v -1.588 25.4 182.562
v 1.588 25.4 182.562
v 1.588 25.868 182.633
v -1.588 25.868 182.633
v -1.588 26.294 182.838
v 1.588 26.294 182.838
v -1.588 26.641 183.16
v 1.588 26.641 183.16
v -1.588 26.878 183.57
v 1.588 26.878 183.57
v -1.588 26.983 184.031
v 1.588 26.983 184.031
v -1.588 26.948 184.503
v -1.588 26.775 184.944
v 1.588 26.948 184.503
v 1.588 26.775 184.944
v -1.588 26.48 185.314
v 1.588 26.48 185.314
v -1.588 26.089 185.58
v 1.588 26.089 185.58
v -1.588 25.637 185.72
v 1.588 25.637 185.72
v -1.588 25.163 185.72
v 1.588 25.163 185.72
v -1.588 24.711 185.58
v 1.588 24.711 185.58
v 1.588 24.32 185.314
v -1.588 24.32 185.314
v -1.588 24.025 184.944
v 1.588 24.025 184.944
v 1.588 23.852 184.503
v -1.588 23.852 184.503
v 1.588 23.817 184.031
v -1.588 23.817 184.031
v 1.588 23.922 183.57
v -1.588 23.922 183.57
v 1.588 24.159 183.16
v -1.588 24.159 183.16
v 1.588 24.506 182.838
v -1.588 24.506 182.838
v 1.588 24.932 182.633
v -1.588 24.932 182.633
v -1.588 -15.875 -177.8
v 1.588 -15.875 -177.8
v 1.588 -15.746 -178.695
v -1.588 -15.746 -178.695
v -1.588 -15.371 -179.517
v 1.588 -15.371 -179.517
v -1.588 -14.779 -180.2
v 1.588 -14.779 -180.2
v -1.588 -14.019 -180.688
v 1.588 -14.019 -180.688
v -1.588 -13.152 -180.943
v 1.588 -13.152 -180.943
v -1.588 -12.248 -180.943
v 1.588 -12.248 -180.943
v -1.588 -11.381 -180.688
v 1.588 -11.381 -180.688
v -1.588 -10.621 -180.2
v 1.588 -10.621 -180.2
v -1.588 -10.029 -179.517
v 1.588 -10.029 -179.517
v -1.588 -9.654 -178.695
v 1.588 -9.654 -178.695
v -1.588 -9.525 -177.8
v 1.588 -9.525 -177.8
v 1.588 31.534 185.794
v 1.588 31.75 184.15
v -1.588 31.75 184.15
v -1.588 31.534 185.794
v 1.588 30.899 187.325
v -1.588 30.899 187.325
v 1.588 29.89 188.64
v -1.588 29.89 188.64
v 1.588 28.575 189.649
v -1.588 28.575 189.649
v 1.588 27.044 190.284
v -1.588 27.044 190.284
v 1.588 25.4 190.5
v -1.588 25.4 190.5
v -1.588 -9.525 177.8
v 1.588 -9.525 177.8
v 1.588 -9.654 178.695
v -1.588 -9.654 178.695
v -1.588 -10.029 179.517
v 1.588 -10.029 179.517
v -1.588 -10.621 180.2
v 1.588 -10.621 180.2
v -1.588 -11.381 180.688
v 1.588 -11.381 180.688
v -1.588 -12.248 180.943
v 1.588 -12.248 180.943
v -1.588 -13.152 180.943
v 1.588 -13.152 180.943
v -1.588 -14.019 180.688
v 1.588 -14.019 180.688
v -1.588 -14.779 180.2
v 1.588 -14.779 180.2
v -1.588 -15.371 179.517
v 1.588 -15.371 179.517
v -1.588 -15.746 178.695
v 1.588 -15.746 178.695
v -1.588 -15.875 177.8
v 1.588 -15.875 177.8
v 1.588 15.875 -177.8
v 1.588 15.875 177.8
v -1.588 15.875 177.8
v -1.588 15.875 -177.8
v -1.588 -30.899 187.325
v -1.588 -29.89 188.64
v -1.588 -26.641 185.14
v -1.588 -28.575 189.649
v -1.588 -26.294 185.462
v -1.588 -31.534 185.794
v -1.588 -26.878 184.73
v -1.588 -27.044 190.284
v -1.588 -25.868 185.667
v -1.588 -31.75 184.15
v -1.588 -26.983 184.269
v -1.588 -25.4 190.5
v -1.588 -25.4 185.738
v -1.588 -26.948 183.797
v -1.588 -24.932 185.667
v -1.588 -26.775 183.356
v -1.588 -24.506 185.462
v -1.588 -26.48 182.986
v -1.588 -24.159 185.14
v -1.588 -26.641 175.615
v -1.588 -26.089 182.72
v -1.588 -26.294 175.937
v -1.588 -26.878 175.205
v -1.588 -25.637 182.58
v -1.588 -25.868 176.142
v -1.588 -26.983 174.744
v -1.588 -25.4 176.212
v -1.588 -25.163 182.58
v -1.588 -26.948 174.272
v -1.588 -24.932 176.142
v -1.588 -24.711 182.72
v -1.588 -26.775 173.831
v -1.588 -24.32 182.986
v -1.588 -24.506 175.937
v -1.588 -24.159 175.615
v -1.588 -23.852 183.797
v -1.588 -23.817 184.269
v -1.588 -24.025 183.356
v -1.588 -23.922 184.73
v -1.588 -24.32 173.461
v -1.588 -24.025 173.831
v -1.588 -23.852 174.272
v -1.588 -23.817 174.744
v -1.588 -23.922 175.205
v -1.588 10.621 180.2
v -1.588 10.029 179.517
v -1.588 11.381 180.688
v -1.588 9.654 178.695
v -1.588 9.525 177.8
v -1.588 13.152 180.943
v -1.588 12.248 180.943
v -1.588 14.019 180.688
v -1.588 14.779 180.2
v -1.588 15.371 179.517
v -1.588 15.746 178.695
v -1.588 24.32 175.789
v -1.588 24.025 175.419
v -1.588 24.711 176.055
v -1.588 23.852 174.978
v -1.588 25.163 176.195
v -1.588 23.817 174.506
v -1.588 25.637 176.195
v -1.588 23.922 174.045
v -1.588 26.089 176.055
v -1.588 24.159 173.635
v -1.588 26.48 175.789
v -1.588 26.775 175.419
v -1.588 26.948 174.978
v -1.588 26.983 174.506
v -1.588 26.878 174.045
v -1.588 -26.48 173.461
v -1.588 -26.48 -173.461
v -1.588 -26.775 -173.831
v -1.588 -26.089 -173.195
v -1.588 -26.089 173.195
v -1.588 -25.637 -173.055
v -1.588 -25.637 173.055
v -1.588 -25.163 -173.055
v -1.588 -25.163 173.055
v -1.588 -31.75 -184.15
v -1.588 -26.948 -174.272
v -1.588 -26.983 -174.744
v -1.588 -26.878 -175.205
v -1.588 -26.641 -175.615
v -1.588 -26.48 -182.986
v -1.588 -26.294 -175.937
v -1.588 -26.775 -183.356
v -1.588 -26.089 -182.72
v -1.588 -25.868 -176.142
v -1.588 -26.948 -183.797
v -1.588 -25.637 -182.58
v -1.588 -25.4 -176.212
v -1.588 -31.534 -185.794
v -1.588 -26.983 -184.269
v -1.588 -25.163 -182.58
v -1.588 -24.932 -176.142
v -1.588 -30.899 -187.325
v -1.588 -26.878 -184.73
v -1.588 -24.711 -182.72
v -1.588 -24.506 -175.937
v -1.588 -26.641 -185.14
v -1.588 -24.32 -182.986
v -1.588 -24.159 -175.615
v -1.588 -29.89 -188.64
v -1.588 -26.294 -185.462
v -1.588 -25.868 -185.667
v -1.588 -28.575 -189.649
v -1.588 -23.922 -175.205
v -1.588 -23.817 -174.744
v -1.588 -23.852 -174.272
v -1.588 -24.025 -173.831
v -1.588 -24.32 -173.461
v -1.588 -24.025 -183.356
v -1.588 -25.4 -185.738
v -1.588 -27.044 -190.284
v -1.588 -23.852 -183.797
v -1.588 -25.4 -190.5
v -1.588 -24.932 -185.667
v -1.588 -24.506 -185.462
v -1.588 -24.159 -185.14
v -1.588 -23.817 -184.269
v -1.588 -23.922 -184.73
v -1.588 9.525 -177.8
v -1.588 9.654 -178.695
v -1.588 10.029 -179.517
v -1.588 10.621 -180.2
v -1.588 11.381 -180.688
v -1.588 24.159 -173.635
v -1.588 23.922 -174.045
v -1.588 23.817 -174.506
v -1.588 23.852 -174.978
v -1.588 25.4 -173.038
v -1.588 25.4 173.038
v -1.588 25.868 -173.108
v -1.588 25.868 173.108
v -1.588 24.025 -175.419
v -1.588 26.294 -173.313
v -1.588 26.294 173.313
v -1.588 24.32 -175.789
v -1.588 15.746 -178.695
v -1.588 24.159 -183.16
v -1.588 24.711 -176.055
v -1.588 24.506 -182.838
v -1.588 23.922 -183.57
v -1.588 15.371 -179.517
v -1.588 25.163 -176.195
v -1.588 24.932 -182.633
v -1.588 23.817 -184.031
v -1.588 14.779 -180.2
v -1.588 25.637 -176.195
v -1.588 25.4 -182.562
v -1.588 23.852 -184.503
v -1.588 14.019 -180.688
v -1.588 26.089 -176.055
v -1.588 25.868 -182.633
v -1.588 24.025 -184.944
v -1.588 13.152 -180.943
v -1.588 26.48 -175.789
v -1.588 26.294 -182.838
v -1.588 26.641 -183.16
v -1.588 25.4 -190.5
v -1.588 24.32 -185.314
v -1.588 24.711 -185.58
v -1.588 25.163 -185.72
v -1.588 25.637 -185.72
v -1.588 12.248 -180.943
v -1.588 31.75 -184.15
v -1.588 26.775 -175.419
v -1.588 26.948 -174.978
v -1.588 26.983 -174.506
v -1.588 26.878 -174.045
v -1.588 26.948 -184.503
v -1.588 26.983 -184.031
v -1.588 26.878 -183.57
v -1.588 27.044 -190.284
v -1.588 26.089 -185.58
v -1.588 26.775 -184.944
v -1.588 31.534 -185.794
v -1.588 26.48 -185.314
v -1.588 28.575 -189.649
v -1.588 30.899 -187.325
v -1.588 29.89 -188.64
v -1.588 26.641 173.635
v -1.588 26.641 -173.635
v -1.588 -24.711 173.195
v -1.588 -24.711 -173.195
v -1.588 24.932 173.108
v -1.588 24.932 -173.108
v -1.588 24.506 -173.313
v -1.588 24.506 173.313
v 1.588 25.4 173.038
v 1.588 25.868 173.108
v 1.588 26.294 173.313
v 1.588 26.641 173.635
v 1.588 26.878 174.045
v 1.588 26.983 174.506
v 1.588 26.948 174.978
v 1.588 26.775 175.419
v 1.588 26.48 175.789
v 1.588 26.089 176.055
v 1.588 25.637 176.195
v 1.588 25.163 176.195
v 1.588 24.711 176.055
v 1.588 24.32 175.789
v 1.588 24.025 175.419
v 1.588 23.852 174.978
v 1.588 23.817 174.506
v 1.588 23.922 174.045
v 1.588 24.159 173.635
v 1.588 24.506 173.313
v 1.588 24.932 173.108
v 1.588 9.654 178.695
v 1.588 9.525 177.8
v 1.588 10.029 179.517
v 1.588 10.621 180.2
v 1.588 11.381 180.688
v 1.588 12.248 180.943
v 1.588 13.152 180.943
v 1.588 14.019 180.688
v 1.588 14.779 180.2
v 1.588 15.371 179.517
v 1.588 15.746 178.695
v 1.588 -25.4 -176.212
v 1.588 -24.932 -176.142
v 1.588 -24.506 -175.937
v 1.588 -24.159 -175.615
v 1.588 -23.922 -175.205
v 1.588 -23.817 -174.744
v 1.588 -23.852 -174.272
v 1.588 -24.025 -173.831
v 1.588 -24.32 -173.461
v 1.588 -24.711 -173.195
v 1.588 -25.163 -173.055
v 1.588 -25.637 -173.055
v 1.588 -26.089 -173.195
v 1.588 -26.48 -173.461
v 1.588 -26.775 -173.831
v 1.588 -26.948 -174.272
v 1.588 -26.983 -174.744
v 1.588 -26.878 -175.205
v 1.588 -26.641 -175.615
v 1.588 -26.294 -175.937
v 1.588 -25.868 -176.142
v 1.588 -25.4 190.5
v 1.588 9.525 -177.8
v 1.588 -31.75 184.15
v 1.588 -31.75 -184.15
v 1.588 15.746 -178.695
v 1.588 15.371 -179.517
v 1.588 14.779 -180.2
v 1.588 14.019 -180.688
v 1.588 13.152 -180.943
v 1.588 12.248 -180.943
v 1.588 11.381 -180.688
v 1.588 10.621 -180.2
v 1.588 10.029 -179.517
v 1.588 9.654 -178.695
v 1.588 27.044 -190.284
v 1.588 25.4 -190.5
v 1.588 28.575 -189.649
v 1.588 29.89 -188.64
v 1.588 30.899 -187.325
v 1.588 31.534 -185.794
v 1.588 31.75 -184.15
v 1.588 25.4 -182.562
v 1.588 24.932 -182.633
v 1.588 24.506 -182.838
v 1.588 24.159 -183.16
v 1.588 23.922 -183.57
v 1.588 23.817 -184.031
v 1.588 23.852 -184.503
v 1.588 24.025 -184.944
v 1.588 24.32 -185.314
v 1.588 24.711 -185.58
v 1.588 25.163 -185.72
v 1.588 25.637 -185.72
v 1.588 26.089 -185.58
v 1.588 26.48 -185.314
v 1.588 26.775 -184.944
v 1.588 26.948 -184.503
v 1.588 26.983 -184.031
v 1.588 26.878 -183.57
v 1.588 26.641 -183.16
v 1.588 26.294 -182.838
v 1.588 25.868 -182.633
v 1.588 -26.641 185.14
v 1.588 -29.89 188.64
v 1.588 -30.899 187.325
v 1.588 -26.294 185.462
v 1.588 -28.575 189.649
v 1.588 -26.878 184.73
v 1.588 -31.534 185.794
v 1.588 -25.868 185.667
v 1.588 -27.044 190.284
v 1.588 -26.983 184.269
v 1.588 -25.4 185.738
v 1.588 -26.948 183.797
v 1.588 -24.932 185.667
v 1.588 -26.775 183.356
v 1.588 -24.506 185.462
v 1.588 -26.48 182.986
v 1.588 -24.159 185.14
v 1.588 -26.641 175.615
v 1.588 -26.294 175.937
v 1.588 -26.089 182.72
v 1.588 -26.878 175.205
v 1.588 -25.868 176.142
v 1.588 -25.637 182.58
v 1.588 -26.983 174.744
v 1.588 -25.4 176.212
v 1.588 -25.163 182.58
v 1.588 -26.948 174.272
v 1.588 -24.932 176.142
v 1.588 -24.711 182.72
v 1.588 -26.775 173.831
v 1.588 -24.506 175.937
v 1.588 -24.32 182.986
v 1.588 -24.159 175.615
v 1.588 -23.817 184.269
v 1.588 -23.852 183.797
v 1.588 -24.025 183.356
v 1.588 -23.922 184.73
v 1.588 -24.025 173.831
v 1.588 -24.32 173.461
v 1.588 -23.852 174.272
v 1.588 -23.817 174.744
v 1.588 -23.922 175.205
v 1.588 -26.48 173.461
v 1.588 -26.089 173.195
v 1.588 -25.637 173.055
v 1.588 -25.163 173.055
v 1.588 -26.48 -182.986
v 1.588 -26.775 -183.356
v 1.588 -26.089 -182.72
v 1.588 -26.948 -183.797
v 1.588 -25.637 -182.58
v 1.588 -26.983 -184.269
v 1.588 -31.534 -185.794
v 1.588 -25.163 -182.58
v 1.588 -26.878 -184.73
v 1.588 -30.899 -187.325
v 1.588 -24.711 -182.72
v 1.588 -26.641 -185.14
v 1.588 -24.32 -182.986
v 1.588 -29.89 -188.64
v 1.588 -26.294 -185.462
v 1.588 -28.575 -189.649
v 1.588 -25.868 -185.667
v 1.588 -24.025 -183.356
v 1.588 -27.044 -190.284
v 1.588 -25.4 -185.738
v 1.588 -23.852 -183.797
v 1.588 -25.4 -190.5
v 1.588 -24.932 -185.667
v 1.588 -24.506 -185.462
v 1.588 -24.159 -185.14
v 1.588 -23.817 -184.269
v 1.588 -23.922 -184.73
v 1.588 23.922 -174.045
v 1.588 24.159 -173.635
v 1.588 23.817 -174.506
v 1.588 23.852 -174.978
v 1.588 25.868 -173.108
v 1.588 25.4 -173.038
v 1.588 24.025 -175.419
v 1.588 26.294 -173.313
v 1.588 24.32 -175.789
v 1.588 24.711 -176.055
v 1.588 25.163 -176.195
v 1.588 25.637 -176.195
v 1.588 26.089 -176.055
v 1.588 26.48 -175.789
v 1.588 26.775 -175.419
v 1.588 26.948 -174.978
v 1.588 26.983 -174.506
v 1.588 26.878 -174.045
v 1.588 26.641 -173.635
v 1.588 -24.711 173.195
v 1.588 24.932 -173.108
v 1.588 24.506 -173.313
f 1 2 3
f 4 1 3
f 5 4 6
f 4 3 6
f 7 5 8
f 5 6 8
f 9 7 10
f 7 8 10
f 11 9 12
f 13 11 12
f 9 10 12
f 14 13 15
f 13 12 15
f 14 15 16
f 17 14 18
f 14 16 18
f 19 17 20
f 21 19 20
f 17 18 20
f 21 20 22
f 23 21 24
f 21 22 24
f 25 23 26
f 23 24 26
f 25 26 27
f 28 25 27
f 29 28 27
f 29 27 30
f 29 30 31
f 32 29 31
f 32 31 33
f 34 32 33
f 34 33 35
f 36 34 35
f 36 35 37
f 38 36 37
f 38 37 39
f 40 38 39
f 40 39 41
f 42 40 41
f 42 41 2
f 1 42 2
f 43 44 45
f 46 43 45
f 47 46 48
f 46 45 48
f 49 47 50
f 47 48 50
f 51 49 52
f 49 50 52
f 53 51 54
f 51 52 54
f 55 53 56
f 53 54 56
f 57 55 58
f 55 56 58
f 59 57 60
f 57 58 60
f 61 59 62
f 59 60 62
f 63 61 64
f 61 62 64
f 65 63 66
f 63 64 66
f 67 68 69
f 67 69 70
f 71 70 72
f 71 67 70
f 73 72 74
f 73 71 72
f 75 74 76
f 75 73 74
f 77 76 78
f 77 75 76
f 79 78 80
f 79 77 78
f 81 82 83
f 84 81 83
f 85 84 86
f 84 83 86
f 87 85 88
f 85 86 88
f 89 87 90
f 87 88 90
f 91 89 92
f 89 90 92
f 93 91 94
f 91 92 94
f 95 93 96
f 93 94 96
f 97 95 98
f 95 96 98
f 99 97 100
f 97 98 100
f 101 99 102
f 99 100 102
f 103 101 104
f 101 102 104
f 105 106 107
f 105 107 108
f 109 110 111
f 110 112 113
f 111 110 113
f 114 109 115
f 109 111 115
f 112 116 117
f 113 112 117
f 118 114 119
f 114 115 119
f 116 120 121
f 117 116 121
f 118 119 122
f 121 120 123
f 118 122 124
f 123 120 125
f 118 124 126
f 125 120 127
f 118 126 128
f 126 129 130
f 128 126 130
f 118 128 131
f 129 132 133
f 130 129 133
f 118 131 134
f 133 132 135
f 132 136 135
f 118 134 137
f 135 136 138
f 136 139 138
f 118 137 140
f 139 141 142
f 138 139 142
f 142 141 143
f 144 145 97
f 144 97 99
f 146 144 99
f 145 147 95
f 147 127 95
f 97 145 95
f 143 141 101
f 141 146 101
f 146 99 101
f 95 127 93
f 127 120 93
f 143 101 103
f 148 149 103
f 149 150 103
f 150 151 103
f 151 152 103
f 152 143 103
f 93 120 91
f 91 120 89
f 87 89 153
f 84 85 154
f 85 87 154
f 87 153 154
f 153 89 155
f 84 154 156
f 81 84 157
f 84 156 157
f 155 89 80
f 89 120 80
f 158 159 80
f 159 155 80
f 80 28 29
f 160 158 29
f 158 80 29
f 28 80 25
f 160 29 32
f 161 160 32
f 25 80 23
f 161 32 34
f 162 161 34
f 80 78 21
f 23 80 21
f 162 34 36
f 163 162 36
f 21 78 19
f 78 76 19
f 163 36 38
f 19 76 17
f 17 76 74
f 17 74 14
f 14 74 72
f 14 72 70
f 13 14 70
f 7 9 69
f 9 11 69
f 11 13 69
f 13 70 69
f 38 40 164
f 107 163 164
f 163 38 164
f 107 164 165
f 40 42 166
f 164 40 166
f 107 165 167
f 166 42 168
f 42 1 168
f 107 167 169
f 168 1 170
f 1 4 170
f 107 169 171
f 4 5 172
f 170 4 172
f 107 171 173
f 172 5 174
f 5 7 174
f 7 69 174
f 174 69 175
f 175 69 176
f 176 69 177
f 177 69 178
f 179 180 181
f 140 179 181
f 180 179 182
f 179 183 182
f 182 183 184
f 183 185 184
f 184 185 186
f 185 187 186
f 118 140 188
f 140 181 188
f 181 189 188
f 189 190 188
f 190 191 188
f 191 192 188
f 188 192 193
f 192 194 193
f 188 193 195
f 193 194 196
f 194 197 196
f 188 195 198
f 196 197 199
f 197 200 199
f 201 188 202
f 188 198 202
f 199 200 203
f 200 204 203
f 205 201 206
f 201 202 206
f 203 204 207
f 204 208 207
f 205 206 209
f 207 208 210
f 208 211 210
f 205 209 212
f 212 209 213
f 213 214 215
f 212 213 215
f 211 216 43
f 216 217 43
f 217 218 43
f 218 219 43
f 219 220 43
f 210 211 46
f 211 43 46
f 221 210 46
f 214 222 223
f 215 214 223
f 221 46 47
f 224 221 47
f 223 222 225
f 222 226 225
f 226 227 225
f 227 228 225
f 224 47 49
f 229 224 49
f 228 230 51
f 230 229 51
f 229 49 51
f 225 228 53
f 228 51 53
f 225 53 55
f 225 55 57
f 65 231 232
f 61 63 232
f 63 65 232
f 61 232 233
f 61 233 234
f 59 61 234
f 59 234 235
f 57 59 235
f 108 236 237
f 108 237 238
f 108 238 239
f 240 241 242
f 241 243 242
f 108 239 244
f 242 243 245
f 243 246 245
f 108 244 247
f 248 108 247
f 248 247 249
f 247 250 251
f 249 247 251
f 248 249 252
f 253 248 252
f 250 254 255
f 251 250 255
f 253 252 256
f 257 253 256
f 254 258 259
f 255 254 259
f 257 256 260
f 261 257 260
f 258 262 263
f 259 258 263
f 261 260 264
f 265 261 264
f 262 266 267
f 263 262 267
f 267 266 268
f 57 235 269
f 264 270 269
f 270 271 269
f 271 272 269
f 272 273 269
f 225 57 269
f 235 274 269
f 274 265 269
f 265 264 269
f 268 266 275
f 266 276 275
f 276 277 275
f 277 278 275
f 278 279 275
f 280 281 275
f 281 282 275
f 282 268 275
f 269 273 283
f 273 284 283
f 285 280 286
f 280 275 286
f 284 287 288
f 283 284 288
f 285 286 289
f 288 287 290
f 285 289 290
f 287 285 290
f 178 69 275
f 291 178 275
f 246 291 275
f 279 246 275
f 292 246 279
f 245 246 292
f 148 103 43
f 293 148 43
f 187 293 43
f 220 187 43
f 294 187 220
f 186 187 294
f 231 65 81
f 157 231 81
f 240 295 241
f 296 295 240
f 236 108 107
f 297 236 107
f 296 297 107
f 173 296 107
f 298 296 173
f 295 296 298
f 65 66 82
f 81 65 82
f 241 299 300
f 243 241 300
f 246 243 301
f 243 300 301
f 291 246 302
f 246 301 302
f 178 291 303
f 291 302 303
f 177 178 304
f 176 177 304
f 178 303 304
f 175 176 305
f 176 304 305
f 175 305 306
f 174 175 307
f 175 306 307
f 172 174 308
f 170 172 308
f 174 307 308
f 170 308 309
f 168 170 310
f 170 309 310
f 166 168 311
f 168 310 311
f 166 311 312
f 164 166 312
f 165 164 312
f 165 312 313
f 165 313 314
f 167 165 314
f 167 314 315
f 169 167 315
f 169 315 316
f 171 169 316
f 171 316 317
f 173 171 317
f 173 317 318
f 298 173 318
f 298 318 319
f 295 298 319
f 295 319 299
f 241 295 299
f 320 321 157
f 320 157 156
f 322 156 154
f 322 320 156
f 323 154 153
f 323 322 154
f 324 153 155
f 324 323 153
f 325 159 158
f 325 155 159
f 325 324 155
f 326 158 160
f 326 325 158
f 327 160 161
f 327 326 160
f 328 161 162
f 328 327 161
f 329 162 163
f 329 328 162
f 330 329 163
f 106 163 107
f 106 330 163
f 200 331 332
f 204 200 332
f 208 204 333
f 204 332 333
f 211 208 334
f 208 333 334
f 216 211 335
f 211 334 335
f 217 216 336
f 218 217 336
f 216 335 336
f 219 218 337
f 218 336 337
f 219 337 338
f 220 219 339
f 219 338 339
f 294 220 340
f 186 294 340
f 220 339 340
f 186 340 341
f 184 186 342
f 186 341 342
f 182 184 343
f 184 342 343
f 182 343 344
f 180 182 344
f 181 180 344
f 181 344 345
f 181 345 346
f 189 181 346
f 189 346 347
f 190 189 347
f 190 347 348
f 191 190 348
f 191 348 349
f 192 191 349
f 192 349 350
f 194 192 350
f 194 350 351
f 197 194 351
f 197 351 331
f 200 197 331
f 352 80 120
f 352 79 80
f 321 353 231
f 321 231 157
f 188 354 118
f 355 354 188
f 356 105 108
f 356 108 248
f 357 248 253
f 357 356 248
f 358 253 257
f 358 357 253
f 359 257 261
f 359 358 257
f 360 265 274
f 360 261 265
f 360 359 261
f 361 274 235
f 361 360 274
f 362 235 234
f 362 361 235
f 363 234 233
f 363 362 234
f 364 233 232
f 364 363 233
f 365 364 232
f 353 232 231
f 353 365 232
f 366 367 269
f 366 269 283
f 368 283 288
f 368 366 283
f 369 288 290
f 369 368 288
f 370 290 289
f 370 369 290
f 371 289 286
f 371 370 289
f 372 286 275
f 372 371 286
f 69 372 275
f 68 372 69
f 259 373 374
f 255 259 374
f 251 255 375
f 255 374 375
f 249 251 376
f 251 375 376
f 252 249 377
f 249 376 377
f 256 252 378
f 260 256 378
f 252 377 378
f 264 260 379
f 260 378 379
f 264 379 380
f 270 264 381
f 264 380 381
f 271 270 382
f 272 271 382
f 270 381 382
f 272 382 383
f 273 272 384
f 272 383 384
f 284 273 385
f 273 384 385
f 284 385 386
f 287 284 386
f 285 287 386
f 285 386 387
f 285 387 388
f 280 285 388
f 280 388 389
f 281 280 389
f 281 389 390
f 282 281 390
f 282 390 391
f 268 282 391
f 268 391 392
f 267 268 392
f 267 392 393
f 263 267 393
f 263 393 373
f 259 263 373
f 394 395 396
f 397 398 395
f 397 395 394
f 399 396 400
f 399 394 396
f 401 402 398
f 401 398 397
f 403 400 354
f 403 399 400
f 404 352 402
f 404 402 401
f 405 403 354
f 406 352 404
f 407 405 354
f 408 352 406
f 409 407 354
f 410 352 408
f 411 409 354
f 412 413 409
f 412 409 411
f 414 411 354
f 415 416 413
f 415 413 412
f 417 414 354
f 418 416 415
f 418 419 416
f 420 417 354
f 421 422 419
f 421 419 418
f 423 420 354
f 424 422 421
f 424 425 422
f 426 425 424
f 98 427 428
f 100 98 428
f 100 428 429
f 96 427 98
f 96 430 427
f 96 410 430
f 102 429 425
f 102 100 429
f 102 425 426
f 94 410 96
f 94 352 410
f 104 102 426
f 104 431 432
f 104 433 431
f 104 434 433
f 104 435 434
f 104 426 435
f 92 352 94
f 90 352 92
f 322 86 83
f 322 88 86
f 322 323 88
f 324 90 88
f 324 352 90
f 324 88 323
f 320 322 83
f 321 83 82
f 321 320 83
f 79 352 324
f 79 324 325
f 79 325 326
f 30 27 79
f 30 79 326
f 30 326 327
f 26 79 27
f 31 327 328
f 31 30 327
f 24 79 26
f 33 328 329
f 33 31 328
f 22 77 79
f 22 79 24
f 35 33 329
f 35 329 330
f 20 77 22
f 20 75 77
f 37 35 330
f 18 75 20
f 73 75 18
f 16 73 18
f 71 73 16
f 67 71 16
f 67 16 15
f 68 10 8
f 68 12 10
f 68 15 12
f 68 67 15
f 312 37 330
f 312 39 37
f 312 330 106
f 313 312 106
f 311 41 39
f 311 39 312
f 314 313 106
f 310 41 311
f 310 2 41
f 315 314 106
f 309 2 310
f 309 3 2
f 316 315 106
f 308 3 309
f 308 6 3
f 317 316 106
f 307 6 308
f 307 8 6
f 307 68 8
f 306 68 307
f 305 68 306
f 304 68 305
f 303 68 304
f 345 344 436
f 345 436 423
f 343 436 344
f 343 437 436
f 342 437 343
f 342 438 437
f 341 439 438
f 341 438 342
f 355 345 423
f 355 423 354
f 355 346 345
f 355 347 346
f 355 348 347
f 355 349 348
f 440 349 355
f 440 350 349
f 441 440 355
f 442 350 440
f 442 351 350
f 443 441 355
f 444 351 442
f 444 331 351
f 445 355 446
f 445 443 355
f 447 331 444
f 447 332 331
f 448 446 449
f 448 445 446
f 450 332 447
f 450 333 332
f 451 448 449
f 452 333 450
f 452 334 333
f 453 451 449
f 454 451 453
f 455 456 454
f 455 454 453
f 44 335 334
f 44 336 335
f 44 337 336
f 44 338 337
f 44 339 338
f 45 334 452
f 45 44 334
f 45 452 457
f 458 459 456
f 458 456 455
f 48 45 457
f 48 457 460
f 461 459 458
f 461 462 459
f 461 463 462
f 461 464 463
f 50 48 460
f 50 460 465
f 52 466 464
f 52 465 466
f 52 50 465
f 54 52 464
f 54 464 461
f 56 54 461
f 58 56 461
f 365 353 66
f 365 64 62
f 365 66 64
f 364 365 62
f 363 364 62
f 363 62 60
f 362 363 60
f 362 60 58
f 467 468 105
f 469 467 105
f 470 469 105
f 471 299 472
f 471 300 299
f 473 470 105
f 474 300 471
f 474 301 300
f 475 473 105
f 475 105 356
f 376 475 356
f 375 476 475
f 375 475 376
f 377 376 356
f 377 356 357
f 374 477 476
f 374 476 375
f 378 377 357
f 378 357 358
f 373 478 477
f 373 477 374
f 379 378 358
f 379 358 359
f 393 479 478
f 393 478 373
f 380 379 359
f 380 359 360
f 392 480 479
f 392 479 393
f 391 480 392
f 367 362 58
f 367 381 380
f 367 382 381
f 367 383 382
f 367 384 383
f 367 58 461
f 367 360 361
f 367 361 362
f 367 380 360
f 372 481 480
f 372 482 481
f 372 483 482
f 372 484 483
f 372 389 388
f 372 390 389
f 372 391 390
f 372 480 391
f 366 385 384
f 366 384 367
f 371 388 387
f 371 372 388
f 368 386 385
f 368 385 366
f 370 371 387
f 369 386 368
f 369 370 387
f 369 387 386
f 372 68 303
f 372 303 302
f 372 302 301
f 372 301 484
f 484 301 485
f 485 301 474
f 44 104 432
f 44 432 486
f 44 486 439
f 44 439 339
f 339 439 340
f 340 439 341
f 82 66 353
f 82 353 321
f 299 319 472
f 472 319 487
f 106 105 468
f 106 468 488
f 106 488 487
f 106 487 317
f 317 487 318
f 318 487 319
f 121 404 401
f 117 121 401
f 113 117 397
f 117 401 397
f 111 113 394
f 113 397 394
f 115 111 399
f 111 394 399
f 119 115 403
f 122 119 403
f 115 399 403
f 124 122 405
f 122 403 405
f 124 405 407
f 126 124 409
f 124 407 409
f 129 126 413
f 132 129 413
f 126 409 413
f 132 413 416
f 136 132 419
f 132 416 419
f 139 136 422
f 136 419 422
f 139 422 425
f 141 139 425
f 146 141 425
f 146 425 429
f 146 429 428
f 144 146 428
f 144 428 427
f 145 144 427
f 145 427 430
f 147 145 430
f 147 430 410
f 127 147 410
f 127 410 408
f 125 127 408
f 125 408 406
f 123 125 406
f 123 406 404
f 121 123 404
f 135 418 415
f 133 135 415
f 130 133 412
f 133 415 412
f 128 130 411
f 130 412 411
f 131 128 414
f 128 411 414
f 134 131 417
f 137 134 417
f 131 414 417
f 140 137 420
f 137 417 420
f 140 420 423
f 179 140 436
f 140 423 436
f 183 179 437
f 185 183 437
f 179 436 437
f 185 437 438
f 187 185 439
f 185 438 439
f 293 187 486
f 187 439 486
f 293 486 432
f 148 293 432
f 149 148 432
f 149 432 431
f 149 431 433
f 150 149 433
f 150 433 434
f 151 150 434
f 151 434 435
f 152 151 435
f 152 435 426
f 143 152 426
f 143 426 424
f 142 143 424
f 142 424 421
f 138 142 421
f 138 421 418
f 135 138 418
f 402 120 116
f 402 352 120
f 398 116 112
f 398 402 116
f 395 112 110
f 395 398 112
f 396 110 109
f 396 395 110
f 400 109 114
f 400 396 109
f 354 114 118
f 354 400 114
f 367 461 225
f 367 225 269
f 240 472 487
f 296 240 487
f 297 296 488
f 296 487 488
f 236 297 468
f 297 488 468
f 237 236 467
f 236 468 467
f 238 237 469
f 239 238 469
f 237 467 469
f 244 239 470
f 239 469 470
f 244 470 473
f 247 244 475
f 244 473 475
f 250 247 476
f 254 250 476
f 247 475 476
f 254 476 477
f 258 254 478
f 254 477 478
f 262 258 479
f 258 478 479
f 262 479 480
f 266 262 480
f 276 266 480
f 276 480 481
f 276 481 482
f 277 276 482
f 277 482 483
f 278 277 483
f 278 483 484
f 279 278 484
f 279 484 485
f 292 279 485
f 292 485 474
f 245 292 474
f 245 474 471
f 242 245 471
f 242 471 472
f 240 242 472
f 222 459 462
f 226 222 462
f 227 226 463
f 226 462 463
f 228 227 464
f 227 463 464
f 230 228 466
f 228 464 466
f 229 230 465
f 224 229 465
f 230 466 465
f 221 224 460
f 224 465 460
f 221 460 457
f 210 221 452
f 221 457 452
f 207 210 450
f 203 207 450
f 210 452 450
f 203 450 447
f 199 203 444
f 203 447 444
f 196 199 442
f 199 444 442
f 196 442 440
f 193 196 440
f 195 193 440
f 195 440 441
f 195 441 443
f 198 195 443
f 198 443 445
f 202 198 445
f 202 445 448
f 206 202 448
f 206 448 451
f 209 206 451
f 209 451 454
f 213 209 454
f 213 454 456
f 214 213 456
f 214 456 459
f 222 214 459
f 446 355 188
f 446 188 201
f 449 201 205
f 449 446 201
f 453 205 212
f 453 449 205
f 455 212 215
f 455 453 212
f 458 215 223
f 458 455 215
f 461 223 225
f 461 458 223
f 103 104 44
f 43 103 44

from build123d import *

# Parameters (mm, degrees)
OUTER_CUT_DEPTH   = 1.5875
SLOTS_DEPTH       = 194.153806913
SKETCH3_R         = 1.5875
MOUNT_HOLES_DEPTH = 194.153806913


with BuildPart() as part:
    # Sketch1 → Outer Cut (new, symmetric)
    with BuildSketch(Plane(origin=(0, 0, 0), x_dir=(0, 0, -1), z_dir=(1, 0, 0))):
        with BuildLine():
            Line((-184.15, -31.75), (184.15, -31.75))
            ThreePointArc((184.15, -31.75), (188.640128061, -29.890128061), (190.5, -25.4))
            Line((190.5, -25.4), (190.5, 25.4))
            ThreePointArc((190.5, 25.4), (188.640128061, 29.890128061), (184.15, 31.75))
            Line((184.15, 31.75), (-184.15, 31.75))
            ThreePointArc((-184.15, 31.75), (-188.640128061, 29.890128061), (-190.5, 25.4))
            Line((-190.5, 25.4), (-190.5, -25.4))
            ThreePointArc((-190.5, -25.4), (-188.640128061, -29.890128061), (-184.15, -31.75))
        make_face()
    extrude(amount=OUTER_CUT_DEPTH, both=True)

    # Sketch2 → Slots (cut, through all)
    with BuildSketch(Plane(origin=(1.5875, 0, 0), x_dir=(0, 0, -1), z_dir=(1, 0, 0))):
        with BuildLine():
            Line((-177.8, 15.875), (177.8, 15.875))
            ThreePointArc((177.8, 15.875), (180.975, 12.7), (177.8, 9.525))
            Line((177.8, 9.525), (-177.8, 9.525))
            ThreePointArc((-177.8, 9.525), (-180.975, 12.7), (-177.8, 15.875))
        make_face()
        with BuildLine():
            Line((-177.8, -15.875), (177.8, -15.875))
            ThreePointArc((177.8, -15.875), (180.975, -12.7), (177.8, -9.525))
            Line((177.8, -9.525), (-177.8, -9.525))
            ThreePointArc((-177.8, -9.525), (-180.975, -12.7), (-177.8, -15.875))
        make_face()
    extrude(amount=-SLOTS_DEPTH, mode=Mode.SUBTRACT)

    # Sketch3 → Mount Holes (cut, through all)
    with BuildSketch(Plane(origin=(1.5875, 0, 0), x_dir=(0, 0, -1), z_dir=(1, 0, 0))):
        with Locations((-184.15, 25.4)):
            Circle(SKETCH3_R)
        with Locations((-174.625, 25.4)):
            Circle(SKETCH3_R)
        with Locations(Location((-174.625, -25.4, 0), (0, 0, 180))):
            Circle(SKETCH3_R)
        with Locations(Location((-184.15, -25.4, 0), (0, 0, 180))):
            Circle(SKETCH3_R)
        with Locations(Location((174.625, 25.4, 0), (0, 0, 180))):
            Circle(SKETCH3_R)
        with Locations(Location((184.15, 25.4, 0), (0, 0, 180))):
            Circle(SKETCH3_R)
        with Locations((184.15, -25.4)):
            Circle(SKETCH3_R)
        with Locations((174.625, -25.4)):
            Circle(SKETCH3_R)
    extrude(amount=-MOUNT_HOLES_DEPTH, mode=Mode.SUBTRACT)


solid = part.part
